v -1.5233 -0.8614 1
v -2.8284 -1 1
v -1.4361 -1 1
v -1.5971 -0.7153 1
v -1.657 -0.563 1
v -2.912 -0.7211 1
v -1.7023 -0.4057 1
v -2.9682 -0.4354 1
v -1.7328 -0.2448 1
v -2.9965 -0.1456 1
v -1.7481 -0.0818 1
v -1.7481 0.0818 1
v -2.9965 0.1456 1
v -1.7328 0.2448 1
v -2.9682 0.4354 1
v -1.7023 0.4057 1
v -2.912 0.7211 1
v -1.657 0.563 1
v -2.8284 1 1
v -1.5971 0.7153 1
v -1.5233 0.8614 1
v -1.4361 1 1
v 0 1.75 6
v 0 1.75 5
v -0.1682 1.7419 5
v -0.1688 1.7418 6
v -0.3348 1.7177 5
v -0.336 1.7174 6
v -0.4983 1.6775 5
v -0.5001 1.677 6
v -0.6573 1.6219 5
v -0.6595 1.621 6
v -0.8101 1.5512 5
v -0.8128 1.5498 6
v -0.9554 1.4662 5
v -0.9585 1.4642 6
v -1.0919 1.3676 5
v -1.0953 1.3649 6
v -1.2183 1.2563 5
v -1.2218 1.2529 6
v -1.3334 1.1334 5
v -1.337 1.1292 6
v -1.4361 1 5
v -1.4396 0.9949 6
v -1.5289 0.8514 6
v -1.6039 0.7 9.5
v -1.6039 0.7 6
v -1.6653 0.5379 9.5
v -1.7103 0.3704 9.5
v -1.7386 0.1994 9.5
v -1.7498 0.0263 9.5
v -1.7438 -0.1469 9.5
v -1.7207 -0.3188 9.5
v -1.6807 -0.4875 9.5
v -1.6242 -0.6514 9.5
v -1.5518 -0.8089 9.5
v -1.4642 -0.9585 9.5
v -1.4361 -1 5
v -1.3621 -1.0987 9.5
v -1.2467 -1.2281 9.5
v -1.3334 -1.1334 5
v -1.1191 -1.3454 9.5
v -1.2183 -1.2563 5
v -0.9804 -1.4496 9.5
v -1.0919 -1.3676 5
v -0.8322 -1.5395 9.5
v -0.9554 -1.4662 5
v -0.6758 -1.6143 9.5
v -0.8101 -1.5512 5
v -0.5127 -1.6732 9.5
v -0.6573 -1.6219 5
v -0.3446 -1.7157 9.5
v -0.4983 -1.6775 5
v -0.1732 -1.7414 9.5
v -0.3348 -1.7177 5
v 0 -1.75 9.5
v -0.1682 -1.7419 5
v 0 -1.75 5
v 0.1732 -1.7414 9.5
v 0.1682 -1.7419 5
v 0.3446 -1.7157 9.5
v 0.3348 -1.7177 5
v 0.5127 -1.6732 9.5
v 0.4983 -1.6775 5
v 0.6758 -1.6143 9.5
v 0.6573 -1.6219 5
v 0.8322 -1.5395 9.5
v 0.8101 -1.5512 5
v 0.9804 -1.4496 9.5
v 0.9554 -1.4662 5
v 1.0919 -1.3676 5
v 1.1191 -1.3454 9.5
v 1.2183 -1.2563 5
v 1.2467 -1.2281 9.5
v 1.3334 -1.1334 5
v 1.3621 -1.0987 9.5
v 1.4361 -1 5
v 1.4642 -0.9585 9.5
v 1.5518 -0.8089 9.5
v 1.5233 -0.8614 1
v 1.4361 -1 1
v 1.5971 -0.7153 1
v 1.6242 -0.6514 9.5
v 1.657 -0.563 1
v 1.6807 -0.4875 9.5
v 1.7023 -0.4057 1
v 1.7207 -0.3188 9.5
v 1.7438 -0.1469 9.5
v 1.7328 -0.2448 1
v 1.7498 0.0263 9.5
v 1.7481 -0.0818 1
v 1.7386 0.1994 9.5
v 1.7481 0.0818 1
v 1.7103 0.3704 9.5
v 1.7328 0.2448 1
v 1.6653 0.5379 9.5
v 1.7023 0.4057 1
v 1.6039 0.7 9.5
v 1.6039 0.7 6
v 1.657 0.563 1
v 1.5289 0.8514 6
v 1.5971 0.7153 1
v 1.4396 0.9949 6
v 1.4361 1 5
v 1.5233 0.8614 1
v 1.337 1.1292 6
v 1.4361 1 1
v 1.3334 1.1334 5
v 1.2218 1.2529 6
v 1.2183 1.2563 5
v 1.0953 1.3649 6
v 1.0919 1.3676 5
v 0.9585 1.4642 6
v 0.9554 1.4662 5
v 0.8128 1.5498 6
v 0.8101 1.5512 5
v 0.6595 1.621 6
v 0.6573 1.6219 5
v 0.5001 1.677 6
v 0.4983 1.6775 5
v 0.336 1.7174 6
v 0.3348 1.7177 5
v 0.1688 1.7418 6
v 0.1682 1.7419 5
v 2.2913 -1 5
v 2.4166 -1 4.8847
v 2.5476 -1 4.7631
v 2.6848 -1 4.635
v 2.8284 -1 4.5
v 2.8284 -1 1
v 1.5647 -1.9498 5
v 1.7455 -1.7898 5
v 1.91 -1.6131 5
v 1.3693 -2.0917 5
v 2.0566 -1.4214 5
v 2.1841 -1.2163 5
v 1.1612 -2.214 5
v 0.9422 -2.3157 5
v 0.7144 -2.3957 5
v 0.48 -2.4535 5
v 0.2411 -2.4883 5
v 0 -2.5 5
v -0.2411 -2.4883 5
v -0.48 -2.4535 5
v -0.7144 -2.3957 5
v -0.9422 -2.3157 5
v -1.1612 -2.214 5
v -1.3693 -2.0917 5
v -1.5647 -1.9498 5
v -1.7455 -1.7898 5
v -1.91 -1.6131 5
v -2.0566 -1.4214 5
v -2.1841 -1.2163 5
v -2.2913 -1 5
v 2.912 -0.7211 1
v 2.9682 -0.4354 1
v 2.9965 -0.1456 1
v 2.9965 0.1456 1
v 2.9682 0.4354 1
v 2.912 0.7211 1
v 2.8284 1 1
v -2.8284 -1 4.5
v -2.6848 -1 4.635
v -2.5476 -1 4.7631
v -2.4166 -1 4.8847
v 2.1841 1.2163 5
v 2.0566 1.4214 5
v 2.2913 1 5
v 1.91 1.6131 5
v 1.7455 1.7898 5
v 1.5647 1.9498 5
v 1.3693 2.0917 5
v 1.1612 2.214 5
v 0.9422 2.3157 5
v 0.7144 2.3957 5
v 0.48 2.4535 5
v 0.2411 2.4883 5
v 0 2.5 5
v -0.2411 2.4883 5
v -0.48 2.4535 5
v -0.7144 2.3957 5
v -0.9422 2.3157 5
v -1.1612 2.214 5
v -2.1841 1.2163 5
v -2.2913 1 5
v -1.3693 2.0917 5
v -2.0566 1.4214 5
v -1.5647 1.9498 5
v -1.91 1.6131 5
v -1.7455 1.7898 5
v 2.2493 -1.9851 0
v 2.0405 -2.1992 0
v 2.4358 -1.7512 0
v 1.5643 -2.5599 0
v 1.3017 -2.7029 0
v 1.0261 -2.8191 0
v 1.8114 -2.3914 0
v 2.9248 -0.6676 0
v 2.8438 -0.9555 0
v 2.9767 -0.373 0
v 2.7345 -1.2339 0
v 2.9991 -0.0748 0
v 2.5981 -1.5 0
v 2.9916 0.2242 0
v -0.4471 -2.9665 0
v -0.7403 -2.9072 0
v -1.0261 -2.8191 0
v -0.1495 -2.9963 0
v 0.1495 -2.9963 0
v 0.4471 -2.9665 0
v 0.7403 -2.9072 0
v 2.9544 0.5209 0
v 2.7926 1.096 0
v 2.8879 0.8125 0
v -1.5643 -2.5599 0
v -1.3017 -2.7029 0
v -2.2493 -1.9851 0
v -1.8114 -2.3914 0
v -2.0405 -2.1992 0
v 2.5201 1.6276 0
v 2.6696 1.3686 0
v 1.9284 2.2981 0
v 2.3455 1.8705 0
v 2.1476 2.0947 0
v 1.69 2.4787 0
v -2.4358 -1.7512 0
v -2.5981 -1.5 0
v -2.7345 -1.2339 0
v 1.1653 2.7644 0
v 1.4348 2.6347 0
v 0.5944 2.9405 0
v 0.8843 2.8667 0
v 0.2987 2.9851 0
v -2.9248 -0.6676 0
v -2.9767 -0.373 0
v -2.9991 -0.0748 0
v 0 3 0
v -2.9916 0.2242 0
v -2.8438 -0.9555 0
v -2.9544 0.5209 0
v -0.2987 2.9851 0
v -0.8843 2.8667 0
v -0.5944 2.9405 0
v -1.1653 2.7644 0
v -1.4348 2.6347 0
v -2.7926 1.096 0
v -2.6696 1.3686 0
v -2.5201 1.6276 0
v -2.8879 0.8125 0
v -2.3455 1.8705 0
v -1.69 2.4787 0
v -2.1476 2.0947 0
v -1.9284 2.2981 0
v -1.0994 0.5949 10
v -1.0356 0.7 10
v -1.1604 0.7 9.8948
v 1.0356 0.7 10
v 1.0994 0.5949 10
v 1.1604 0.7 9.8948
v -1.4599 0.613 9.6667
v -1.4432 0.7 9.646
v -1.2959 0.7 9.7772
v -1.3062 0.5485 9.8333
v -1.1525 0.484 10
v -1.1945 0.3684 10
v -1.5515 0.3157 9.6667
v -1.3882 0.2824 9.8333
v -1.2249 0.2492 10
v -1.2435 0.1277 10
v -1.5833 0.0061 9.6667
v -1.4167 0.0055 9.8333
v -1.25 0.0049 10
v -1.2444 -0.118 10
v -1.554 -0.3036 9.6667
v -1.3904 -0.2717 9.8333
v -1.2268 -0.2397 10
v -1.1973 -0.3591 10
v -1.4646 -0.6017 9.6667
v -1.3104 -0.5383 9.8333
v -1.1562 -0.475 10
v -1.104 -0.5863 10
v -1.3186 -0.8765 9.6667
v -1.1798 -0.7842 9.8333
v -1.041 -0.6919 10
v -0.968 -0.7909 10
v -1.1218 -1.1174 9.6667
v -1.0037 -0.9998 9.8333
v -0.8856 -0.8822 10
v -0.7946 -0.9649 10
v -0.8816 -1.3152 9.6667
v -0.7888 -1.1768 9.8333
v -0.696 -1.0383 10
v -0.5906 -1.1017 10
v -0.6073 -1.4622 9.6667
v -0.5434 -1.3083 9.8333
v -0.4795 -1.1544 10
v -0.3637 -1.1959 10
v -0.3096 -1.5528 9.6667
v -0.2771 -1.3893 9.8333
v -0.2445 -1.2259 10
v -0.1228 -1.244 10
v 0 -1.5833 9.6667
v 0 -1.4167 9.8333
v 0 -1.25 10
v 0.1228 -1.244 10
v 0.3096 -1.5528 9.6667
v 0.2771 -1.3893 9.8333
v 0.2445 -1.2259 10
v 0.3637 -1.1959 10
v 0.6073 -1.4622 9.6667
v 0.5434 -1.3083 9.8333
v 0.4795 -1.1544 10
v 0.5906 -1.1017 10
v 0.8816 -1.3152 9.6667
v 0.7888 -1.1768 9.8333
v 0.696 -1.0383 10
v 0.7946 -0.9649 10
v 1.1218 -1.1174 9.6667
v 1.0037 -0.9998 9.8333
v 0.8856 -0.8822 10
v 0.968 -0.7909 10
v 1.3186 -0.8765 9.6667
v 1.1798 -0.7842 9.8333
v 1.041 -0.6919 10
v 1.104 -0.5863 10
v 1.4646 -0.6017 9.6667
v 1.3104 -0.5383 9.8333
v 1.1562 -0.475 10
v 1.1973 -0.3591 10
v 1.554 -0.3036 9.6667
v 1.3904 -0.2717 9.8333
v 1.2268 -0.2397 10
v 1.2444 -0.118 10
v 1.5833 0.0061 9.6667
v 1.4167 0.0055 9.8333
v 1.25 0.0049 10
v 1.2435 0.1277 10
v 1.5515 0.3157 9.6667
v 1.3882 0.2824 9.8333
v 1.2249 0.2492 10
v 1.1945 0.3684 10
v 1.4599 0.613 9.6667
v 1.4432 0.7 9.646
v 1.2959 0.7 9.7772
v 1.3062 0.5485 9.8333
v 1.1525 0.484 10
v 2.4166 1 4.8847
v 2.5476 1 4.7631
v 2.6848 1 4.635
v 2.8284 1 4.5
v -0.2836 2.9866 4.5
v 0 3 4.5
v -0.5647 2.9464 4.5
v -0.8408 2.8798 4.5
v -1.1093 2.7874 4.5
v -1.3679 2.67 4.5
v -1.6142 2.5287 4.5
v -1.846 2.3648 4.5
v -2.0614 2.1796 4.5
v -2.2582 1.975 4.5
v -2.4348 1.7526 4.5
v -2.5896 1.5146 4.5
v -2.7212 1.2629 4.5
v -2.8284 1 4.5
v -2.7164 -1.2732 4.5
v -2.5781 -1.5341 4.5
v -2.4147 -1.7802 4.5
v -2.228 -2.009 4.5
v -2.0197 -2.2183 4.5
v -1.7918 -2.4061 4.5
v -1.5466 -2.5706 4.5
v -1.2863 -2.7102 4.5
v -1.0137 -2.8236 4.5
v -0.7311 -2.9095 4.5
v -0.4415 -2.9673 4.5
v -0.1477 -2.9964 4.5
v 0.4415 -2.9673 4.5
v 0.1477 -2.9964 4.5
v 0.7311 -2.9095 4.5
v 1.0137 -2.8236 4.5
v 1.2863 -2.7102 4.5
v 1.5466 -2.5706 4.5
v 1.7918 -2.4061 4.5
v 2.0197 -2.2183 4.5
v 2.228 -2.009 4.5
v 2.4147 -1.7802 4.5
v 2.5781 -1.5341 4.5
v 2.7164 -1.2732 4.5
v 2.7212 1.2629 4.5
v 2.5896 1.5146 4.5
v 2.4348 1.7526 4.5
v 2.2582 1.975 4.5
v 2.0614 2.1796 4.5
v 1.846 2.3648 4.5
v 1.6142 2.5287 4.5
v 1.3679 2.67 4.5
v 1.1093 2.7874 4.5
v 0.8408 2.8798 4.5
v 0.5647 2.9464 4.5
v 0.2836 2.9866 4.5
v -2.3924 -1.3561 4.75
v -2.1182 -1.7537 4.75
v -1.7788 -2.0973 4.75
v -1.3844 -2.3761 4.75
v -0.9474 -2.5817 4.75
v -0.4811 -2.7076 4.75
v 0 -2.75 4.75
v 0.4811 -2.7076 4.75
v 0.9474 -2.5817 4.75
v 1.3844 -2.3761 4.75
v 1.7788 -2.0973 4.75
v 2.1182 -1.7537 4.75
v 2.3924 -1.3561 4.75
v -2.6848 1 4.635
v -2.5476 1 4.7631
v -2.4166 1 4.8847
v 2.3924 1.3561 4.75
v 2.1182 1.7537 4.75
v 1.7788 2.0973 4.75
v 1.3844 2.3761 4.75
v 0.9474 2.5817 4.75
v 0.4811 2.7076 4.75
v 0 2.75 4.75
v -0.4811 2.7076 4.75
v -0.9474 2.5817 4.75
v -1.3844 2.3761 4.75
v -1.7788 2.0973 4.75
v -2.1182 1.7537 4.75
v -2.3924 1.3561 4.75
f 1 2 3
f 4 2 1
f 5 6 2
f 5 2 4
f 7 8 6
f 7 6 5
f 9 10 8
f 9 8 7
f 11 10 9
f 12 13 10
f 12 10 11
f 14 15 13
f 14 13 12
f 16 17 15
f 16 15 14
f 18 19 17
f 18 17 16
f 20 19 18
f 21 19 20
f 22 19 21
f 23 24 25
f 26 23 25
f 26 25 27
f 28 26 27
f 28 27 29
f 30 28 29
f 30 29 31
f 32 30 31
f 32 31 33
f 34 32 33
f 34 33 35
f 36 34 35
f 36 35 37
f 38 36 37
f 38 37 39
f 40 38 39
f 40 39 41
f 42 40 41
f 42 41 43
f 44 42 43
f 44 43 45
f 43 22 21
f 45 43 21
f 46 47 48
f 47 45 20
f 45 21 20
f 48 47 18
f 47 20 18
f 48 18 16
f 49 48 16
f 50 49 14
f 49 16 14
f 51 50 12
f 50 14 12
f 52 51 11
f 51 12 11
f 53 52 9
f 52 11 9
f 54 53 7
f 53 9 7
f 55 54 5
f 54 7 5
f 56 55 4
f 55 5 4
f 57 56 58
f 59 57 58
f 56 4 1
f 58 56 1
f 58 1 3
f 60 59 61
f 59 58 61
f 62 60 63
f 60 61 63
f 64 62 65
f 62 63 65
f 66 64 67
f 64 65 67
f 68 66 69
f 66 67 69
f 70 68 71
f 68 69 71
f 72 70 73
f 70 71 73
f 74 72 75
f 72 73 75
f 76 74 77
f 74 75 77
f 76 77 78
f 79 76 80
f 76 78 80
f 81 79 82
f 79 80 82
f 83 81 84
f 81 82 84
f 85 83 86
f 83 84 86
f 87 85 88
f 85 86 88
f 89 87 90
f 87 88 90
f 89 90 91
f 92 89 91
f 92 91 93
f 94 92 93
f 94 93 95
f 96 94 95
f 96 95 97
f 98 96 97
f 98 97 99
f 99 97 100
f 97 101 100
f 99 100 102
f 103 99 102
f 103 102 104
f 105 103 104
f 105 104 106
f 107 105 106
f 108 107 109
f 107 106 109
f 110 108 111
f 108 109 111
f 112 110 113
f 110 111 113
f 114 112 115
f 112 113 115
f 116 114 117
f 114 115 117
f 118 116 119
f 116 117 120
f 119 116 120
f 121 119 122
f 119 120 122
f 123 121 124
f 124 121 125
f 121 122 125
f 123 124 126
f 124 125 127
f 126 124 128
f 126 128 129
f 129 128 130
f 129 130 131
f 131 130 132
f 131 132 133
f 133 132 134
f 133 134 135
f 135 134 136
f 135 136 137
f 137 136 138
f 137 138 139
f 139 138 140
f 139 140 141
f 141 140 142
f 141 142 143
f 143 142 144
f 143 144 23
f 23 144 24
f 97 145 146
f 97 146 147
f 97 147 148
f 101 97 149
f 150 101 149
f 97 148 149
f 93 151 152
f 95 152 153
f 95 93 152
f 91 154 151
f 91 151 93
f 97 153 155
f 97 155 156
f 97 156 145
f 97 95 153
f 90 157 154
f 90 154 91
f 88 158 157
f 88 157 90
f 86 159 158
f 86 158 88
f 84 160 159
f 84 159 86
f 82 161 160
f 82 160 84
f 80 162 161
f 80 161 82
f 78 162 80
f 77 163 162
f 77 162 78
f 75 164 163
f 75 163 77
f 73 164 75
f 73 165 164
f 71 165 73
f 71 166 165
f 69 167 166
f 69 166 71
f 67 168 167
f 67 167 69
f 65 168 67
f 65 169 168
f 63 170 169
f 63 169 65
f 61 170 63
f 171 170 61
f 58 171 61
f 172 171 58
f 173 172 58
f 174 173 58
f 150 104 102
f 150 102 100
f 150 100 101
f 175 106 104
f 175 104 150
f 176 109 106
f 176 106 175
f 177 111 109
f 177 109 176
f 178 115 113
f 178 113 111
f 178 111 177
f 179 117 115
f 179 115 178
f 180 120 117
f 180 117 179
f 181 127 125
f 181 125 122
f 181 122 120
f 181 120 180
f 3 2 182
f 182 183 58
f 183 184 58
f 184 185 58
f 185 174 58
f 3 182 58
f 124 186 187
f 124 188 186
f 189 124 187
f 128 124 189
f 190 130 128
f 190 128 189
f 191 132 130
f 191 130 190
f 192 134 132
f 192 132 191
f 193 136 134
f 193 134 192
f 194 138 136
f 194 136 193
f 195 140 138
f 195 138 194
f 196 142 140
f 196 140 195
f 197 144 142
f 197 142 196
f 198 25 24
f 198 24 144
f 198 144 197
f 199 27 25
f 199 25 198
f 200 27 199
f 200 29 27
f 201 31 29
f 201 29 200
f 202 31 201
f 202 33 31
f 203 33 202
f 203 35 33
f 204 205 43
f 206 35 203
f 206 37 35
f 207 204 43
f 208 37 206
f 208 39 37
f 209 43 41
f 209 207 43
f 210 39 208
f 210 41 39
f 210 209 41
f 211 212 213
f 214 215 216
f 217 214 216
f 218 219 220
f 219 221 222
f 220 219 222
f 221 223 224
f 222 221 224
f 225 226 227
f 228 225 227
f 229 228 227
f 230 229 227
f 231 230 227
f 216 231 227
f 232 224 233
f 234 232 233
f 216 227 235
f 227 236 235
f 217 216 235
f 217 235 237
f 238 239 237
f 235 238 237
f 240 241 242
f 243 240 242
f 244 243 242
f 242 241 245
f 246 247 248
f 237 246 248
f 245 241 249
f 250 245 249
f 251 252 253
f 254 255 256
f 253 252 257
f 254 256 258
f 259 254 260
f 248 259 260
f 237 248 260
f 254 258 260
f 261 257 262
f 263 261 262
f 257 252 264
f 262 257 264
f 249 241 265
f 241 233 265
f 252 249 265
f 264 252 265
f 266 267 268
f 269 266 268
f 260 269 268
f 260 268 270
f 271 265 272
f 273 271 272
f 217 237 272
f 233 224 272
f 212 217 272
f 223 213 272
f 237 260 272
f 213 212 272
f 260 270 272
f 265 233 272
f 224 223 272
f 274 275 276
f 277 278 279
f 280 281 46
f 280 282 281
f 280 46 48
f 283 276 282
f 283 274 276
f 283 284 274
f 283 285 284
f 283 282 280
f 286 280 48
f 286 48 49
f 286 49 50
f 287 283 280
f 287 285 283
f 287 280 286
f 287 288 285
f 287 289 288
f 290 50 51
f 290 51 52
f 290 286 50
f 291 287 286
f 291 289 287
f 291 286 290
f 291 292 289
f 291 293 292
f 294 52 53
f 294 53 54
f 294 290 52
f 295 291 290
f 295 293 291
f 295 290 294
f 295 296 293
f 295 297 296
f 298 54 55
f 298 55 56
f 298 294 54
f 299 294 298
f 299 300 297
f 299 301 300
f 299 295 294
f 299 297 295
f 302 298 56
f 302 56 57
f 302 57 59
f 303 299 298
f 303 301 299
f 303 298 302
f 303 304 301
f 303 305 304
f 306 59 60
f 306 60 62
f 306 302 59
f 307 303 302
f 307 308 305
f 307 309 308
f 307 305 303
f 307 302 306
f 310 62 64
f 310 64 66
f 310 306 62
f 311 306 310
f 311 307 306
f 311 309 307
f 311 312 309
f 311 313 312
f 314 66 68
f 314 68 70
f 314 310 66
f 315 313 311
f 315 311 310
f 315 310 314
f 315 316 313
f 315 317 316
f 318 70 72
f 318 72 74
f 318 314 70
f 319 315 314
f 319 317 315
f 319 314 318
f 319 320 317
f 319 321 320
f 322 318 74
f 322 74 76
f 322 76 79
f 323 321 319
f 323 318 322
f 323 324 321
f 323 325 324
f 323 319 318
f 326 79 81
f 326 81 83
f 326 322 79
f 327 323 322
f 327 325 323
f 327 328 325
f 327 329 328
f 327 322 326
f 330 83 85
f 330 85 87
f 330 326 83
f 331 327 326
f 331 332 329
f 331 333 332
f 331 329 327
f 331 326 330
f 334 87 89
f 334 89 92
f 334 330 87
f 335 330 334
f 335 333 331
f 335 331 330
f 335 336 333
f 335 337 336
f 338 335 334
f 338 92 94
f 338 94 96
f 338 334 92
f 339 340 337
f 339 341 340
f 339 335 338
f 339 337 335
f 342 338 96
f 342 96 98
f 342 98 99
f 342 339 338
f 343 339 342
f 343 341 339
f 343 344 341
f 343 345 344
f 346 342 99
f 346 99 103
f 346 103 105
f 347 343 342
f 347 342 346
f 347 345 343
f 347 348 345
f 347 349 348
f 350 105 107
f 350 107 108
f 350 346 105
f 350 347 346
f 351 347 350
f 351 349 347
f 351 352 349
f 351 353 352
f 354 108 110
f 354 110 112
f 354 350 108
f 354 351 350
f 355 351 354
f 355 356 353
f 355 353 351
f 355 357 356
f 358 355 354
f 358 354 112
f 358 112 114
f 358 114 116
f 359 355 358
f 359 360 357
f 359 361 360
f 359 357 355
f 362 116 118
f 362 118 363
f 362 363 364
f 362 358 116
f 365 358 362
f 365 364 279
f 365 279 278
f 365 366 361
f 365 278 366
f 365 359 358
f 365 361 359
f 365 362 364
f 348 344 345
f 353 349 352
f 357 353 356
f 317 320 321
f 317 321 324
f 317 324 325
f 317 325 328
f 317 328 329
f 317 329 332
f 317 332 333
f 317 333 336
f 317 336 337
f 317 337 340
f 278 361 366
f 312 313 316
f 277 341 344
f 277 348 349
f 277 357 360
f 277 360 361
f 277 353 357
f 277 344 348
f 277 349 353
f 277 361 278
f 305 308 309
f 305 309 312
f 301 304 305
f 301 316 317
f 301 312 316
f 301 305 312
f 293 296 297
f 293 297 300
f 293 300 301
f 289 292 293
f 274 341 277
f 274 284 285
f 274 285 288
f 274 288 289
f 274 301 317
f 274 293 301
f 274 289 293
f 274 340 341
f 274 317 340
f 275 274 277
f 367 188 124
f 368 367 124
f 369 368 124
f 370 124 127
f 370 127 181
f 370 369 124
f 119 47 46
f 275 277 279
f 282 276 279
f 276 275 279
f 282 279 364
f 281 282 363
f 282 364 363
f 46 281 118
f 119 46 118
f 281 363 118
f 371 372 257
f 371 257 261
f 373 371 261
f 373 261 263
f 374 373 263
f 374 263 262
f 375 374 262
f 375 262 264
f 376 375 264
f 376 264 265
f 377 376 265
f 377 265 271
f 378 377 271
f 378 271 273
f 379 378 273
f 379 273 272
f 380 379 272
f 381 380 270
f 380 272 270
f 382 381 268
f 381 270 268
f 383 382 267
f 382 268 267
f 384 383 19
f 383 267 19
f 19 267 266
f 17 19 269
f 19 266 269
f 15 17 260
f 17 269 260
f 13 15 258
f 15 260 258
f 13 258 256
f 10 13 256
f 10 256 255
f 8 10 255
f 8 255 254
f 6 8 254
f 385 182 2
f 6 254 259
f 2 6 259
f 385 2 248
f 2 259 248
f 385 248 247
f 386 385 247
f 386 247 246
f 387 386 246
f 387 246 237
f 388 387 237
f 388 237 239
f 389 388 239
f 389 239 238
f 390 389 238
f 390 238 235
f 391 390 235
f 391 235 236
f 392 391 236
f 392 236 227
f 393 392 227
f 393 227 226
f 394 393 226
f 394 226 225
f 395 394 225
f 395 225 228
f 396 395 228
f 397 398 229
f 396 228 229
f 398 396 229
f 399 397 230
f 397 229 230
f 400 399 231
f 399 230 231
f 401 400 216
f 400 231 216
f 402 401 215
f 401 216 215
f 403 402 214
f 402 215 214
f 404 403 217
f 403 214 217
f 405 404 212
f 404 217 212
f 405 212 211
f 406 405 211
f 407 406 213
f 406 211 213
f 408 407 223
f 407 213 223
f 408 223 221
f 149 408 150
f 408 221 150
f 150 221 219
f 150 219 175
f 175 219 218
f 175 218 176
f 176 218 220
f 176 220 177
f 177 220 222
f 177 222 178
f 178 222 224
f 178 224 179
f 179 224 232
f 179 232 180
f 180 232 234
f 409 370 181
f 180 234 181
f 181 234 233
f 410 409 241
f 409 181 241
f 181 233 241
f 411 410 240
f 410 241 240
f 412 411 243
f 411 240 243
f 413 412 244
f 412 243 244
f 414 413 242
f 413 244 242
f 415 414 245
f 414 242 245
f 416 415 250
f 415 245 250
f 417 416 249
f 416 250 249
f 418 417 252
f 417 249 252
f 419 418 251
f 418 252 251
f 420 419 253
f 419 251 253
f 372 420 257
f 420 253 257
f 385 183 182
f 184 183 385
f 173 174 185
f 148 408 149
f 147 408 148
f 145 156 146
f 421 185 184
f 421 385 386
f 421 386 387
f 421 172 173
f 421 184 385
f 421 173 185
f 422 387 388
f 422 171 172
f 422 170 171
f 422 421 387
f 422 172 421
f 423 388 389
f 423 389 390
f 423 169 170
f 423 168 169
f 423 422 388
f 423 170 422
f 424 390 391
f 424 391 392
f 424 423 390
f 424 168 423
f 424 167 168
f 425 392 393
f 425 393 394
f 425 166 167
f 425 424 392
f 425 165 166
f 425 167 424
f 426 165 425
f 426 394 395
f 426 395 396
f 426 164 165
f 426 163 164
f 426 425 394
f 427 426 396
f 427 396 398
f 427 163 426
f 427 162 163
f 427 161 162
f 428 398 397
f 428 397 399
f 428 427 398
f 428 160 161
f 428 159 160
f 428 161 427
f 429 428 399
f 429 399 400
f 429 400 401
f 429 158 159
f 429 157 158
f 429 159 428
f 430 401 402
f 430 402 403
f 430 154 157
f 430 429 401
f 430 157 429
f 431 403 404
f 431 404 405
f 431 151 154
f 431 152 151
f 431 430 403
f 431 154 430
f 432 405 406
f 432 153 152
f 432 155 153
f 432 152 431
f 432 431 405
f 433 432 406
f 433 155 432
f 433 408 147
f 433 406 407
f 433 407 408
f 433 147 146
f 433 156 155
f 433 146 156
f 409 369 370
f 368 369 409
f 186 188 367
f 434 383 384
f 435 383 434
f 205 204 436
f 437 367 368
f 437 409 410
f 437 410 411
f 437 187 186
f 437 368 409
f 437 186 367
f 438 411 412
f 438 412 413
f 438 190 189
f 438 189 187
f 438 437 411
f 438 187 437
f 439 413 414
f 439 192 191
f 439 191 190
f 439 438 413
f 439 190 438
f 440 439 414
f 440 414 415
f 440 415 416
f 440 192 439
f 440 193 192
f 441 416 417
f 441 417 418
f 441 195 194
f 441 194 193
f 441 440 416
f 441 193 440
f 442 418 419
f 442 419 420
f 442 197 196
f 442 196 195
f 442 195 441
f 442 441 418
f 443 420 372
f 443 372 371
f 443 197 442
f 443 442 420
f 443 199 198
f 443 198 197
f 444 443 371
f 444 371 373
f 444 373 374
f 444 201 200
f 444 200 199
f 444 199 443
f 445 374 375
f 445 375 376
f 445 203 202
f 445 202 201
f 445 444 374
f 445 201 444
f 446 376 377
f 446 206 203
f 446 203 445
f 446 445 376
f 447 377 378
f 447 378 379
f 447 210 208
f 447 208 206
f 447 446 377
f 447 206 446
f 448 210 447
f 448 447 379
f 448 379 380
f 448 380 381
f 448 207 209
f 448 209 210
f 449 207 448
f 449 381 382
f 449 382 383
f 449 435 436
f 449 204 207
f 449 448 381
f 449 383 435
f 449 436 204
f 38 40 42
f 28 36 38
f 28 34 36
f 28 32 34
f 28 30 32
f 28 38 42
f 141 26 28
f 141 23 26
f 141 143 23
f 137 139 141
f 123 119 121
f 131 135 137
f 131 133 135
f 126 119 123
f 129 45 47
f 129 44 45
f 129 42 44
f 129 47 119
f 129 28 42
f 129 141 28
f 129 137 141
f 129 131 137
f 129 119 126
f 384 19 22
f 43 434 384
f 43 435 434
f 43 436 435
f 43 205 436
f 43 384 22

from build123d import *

# Parameters (mm, degrees)
SKETCH_R        = 3
PAD_DEPTH       = 5
SKETCH001_W     = 15.685142
SKETCH001_H     = 2
POCKET_DEPTH    = 4
SKETCH002_R     = 1.75
PAD001_DEPTH    = 10
SKETCH003_W     = 8.687401
SKETCH003_H     = 3.263626
POCKET001_DEPTH = 4
CHAMFER_SIZE    = 0.5


with BuildPart() as part:
    # Sketch → Pad (new body)
    with BuildSketch(Plane(origin=(0, 0, 0), x_dir=(0, 1, 0), z_dir=(0, 0, 1))):
        Circle(SKETCH_R)
    extrude(amount=PAD_DEPTH)

    # Sketch001 → Pocket (cut)
    with BuildSketch(Plane.XY.offset(5)):
        Rectangle(SKETCH001_W, SKETCH001_H)
    extrude(amount=-POCKET_DEPTH, mode=Mode.SUBTRACT)

    # Sketch002 → Pad001 (join)
    with BuildSketch(Plane(origin=(0, 0, 0), x_dir=(0, 1, 0), z_dir=(0, 0, 1))):
        Circle(SKETCH002_R)
    extrude(amount=PAD001_DEPTH)

    # Sketch003 → Pocket001 (cut)
    with BuildSketch(Plane.XY.offset(10)):
        with Locations((-0.081454, 2.331813)):
            Rectangle(SKETCH003_W, SKETCH003_H)
    extrude(amount=-POCKET001_DEPTH, mode=Mode.SUBTRACT)

    # Chamfer
    chamfer_edges = [part.edges().sort_by_distance(p)[0] for p in [
        (0, -1.75, 10),
        (0, -3, 5),
        (-1.732051, 2.44949, 5),
        (1.732051, 2.44949, 5),
    ]]
    chamfer(chamfer_edges, length=CHAMFER_SIZE)


solid = part.part
